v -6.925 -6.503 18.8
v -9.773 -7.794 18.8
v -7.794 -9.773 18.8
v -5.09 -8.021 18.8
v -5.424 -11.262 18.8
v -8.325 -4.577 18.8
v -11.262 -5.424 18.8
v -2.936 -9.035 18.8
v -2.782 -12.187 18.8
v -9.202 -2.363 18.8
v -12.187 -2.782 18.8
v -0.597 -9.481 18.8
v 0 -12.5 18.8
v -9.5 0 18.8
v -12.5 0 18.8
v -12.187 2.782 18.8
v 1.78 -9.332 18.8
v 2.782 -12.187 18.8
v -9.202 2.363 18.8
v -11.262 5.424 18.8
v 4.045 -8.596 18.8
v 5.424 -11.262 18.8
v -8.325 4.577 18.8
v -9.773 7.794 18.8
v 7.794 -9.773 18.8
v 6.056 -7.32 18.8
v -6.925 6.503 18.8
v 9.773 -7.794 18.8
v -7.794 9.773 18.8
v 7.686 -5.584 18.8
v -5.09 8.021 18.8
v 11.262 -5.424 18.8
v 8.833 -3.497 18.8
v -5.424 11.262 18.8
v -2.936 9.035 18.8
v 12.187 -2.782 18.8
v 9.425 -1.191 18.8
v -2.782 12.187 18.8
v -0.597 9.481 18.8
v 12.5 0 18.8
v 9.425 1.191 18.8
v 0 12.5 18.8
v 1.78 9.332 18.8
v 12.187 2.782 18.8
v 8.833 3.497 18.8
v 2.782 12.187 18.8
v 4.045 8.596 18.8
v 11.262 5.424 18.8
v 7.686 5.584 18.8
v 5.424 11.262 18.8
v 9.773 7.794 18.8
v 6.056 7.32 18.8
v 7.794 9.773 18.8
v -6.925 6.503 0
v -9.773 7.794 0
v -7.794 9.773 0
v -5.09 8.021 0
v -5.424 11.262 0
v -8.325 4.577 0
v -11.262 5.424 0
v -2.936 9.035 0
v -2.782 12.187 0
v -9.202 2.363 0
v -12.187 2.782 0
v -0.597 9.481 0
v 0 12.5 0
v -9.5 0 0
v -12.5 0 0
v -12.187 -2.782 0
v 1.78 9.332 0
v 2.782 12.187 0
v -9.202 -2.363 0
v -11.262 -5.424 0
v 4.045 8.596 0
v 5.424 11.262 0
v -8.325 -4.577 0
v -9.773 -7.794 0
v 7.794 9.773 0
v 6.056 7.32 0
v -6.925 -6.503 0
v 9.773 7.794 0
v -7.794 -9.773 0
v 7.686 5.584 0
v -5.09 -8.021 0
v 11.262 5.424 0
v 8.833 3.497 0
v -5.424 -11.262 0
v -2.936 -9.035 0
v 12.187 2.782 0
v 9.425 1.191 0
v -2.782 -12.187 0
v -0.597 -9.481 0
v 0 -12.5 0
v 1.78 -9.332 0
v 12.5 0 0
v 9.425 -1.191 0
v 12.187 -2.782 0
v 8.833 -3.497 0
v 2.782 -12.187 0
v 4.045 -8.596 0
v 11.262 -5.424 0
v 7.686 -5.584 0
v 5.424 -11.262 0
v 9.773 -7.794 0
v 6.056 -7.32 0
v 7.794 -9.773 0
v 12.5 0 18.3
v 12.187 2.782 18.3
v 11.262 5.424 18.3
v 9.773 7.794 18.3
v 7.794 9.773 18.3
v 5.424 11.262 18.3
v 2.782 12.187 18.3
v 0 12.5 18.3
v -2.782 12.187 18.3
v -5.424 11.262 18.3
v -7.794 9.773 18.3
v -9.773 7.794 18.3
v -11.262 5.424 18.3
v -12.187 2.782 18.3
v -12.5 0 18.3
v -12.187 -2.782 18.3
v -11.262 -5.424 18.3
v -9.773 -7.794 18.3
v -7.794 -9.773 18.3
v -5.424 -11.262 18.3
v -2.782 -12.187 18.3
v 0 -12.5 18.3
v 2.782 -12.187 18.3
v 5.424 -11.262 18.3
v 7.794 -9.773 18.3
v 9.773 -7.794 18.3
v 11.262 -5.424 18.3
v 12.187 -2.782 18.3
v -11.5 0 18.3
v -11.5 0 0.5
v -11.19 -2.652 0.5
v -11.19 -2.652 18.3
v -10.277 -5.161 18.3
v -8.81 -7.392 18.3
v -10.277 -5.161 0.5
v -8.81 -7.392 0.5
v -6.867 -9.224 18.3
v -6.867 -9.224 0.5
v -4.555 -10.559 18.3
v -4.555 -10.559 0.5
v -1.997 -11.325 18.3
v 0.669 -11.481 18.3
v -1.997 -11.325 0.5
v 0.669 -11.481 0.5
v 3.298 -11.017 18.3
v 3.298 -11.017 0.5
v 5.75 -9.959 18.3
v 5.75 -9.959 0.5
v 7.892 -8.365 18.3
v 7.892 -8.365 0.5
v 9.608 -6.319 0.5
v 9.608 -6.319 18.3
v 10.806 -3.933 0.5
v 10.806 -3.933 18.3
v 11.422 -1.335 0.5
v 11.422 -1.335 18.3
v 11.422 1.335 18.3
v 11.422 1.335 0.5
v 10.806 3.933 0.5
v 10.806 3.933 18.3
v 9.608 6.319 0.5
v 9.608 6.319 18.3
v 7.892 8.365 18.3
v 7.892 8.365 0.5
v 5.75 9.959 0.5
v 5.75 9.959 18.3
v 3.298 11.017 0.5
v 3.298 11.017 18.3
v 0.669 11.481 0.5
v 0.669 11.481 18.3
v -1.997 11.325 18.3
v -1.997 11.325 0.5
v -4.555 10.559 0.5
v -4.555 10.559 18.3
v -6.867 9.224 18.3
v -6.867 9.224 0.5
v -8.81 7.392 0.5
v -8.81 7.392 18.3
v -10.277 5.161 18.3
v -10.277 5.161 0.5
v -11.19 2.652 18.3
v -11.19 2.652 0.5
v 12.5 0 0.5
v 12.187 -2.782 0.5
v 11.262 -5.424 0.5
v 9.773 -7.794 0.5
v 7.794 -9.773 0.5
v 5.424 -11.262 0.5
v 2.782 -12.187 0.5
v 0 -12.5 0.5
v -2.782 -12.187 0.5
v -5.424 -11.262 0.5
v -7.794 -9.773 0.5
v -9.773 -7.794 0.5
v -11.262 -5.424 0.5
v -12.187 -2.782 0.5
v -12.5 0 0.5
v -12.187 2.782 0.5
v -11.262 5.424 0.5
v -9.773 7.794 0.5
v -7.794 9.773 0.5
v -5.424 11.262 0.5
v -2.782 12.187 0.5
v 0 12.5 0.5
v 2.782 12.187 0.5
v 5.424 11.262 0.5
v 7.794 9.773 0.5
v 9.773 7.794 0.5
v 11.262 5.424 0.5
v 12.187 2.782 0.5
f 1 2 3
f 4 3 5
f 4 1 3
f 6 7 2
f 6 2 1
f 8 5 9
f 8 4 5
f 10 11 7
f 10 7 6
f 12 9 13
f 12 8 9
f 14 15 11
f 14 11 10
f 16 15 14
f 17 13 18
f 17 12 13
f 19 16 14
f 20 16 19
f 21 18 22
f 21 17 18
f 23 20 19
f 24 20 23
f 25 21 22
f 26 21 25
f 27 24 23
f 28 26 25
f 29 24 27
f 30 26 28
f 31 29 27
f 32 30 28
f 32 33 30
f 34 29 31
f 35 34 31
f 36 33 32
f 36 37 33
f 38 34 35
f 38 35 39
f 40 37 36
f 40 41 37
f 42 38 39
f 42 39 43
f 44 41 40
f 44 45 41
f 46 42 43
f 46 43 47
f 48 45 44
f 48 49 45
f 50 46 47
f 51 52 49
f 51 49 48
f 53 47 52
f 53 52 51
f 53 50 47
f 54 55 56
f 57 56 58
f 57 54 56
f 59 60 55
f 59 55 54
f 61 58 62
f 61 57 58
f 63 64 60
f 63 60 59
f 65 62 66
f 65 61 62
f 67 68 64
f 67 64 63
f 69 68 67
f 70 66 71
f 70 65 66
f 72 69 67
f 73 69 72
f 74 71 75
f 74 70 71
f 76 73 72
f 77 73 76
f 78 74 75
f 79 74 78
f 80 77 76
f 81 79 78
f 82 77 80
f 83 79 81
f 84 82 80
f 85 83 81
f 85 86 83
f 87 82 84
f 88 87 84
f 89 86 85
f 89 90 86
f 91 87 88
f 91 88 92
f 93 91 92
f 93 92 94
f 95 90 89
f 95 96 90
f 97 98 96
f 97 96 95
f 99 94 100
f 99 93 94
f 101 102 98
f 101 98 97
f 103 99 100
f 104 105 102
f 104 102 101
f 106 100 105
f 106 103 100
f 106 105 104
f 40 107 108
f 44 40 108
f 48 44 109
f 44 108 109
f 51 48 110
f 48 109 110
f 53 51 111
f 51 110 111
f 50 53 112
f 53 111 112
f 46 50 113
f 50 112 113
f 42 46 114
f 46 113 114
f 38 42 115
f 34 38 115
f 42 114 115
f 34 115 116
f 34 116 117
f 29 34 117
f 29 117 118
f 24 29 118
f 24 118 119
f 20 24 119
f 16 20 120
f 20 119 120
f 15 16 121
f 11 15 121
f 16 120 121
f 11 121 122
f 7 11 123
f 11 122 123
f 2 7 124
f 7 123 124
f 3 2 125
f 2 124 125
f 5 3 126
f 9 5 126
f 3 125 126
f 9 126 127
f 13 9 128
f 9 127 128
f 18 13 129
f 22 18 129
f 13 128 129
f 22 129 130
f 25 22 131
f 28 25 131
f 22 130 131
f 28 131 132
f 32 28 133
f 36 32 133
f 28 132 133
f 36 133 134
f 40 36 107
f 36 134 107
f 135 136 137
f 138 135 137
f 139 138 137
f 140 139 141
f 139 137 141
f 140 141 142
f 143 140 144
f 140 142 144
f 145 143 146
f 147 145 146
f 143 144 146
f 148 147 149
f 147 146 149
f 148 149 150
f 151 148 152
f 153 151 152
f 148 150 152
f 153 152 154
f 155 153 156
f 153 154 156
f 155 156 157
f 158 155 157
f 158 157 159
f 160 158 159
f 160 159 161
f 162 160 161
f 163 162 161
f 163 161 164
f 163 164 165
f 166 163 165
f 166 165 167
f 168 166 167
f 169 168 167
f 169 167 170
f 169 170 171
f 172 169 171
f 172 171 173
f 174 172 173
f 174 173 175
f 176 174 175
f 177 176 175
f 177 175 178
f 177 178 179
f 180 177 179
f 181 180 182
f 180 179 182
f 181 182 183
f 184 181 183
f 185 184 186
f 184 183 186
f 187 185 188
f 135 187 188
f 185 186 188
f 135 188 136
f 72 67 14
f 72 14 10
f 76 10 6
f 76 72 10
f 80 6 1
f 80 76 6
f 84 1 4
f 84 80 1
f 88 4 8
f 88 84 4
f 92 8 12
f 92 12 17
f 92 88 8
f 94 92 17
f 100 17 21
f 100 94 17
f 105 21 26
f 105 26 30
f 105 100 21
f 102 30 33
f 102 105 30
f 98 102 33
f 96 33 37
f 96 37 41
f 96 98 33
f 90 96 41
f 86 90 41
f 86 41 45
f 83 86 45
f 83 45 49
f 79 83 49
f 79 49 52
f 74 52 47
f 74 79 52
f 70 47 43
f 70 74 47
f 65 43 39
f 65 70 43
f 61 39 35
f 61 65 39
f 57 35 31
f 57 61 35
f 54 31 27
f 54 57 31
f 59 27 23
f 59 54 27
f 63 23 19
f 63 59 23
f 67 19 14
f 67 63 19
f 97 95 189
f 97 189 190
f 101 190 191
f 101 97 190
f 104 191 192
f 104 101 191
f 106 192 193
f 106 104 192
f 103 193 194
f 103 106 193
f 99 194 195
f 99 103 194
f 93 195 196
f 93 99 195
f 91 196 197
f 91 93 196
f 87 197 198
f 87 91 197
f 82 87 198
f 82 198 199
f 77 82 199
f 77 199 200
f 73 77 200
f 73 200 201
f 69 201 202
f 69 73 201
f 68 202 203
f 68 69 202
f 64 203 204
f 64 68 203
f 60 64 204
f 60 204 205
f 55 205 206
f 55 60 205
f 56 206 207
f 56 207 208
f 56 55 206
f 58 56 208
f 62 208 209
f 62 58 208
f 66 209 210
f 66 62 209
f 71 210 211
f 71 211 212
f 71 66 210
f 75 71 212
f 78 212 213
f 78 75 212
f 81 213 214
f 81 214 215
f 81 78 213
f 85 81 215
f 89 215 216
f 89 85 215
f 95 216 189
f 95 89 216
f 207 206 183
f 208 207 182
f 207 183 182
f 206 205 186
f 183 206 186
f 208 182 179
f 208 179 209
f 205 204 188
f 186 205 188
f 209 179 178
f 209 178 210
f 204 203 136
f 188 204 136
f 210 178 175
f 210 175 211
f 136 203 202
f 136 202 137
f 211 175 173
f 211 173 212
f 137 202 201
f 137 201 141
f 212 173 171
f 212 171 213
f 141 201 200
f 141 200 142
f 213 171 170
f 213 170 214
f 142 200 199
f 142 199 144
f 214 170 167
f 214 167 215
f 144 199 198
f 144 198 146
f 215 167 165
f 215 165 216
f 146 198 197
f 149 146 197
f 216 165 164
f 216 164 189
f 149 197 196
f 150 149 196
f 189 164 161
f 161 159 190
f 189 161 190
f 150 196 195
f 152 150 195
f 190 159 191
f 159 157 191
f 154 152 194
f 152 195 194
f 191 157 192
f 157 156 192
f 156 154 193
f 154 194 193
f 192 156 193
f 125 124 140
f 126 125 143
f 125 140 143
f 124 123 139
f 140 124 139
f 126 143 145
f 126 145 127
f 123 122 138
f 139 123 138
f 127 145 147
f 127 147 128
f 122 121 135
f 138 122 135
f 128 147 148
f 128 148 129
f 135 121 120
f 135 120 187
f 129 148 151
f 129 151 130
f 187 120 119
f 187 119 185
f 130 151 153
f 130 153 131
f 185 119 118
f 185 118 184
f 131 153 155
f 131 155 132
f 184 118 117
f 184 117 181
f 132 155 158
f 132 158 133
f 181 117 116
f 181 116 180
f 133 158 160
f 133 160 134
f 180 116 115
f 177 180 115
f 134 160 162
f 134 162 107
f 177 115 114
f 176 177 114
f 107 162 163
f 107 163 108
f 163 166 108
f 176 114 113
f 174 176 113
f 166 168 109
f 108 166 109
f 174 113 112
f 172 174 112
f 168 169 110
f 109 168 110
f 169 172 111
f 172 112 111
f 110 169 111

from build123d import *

# Parameters (mm, degrees)
SKETCH1_R           = 11.5
SKETCH1_R_2         = 9.5
BOSS_EXTRUDE1_DEPTH = 18.8
BOSS_EXTRUDE3_START = -0.5
SKETCH2_R           = 12.5
SKETCH2_R_2         = 11.5
BOSS_EXTRUDE3_DEPTH = 0.5
SKETCH3_R           = 12.5
SKETCH3_R_2         = 11.5
BOSS_EXTRUDE4_DEPTH = 0.5


with BuildPart() as part:
    # Sketch1 → Boss-Extrude1 (new body)
    with BuildSketch(Plane.XY):
        with Locations(Location((0, 0, 0), (0, 0, 180))):
            Circle(SKETCH1_R)
        with Locations(Location((0, 0, 0), (0, 0, 180))):
            Circle(SKETCH1_R_2, mode=Mode.SUBTRACT)
    extrude(amount=BOSS_EXTRUDE1_DEPTH)

    # Sketch2 → Boss-Extrude3 (add)
    with BuildSketch(Plane.XY.offset(18.8).offset(BOSS_EXTRUDE3_START)):
        Circle(SKETCH2_R)
        with Locations(Location((0, 0, 0), (0, 0, 180))):
            Circle(SKETCH2_R_2, mode=Mode.SUBTRACT)
    extrude(amount=BOSS_EXTRUDE3_DEPTH)

    # Sketch3 → Boss-Extrude4 (add)
    with BuildSketch(Plane(origin=(0, 0, 0), x_dir=(-1, 0, 0), z_dir=(0, 0, -1))):
        with Locations(Location((0, 0, 0), (0, 0, 180))):
            Circle(SKETCH3_R)
        Circle(SKETCH3_R_2, mode=Mode.SUBTRACT)
    extrude(amount=-BOSS_EXTRUDE4_DEPTH)


solid = part.part
